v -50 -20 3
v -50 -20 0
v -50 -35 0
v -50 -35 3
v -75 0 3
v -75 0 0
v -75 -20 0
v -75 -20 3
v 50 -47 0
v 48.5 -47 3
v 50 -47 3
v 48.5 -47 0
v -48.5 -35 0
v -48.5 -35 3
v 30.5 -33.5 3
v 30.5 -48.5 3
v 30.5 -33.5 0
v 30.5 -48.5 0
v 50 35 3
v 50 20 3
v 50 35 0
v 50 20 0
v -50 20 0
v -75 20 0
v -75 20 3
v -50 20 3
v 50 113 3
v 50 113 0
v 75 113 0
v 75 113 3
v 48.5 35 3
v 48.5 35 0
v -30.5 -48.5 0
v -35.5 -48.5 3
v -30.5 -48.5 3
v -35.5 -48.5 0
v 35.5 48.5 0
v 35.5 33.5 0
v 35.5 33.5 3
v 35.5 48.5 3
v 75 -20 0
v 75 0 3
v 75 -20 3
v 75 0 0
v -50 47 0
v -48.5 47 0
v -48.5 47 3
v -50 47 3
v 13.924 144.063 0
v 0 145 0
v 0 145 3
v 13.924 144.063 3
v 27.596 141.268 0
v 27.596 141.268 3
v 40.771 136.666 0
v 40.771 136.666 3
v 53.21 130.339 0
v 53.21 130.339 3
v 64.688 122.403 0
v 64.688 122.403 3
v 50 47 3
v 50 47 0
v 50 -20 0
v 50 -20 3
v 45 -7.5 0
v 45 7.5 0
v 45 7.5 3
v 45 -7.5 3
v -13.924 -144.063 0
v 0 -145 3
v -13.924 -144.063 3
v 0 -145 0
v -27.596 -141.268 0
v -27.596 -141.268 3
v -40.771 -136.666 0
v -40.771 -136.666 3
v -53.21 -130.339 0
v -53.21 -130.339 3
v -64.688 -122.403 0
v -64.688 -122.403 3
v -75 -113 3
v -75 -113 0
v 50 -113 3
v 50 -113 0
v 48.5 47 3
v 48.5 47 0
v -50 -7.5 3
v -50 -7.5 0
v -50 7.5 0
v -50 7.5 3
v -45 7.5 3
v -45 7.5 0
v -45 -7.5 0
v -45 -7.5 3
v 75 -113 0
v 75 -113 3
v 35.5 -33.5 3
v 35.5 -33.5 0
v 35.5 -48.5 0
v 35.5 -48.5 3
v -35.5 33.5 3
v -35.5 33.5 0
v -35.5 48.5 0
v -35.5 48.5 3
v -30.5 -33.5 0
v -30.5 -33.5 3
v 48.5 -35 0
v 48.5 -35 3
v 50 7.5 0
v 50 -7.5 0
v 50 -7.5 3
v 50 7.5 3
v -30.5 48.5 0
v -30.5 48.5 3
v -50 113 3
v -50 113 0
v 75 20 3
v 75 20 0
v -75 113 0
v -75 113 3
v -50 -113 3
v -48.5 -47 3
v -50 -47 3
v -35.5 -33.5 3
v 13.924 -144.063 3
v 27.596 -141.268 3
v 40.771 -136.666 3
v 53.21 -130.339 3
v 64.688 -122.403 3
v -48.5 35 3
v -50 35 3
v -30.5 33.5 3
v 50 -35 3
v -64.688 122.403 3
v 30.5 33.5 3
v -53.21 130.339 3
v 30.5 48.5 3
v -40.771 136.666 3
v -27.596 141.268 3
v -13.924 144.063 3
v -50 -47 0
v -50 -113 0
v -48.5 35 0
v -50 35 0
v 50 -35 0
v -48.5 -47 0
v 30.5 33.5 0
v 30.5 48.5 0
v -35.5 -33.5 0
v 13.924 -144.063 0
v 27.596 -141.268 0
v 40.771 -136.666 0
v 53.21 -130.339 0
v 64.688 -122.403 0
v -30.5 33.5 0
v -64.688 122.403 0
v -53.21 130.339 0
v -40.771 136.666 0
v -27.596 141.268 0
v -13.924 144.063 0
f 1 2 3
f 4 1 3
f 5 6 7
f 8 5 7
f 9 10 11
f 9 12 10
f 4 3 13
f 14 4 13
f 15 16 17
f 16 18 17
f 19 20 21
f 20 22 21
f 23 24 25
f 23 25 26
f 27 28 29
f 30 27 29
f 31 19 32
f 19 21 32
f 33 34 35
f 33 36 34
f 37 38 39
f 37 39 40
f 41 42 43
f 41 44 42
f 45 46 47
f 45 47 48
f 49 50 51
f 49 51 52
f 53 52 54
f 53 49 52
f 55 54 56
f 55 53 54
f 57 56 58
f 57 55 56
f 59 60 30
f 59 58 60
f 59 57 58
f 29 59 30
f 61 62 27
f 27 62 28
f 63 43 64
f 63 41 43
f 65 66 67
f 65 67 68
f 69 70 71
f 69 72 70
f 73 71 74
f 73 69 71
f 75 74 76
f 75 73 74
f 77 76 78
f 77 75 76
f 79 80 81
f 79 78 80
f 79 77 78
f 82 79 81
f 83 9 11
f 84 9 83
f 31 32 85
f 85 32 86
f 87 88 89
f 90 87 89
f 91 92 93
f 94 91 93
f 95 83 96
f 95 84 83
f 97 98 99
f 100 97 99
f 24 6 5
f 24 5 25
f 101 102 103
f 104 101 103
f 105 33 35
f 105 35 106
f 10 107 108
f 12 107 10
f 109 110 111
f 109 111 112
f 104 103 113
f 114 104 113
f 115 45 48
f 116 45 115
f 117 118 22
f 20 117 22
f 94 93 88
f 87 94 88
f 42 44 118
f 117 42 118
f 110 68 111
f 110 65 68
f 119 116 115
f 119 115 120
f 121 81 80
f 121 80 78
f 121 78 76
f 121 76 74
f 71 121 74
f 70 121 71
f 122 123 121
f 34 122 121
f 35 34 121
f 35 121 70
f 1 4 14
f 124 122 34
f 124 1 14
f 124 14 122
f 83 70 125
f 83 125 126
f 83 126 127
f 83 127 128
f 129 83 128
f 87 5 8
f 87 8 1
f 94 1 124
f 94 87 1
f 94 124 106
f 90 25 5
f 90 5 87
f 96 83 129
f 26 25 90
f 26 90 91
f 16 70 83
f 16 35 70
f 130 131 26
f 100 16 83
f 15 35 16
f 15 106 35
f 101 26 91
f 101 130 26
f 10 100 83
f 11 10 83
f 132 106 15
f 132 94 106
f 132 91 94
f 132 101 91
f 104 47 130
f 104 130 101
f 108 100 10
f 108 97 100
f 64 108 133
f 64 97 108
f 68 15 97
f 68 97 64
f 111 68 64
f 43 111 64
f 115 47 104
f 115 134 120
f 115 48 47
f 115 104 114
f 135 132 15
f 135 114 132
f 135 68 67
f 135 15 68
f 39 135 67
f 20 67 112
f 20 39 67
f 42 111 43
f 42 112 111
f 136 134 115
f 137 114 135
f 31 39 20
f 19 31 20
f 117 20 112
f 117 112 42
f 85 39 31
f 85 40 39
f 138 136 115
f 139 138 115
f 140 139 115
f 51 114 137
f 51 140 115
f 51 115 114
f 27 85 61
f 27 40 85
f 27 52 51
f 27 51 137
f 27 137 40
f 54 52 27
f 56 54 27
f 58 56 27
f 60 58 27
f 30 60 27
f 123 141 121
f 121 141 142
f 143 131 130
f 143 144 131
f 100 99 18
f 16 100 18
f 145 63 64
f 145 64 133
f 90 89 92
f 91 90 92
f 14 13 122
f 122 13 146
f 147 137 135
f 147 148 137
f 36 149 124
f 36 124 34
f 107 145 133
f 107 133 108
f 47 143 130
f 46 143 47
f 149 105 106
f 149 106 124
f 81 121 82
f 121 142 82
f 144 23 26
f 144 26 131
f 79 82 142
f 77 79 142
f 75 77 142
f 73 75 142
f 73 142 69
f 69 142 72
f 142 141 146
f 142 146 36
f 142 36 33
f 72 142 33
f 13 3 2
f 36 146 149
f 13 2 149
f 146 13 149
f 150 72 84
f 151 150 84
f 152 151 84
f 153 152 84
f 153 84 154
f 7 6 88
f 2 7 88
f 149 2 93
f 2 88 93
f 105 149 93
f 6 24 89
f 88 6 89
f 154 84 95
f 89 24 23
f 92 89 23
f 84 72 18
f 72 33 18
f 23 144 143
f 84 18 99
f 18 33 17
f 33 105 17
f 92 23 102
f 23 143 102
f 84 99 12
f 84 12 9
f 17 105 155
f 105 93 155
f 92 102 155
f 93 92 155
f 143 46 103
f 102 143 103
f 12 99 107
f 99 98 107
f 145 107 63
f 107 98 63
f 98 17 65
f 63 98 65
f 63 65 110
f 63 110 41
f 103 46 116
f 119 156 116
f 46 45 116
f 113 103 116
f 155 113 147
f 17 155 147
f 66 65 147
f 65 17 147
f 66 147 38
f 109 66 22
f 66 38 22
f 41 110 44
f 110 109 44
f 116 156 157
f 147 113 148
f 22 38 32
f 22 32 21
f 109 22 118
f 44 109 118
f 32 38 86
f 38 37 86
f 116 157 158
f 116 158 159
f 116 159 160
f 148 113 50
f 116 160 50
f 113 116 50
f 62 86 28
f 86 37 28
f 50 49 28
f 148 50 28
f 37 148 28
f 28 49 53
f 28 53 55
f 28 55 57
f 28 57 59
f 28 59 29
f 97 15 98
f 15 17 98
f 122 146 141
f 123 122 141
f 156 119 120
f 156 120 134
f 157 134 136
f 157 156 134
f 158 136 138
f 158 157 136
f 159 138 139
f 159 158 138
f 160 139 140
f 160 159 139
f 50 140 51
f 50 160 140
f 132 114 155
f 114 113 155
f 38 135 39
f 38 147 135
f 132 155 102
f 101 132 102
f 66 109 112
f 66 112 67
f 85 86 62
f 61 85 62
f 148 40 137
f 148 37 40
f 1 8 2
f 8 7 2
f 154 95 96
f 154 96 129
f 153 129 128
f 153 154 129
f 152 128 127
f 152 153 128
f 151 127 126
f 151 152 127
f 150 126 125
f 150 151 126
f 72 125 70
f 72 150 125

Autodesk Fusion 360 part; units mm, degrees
sketch "Sketch1" plane through (0, 0, 0) normal (0, 0, 1) x (1, 0, 0)
  line L0 (0, 0) -> (75, 0) construction
  line L1 (0, 0) -> (0, 145) construction
  line L2 (75, 0) -> (75, 20)
  line L3 (75, 20) -> (50, 20)
  line L4 (50, 20) -> (50, 113)
  line L5 (50, 113) -> (75, 113)
  arc A0 (75, 113) -> (0, 145) centre (0, 41.1094) ccw
  line L6 (0, 145) -> (-55.6559, 145) construction
  line L7 (-75, 0) -> (-75, 20)
  line L8 (-75, 20) -> (-50, 20)
  line L9 (-50, 20) -> (-50, 113)
  line L10 (-50, 113) -> (-75, 113)
  arc A1 (0, 145) -> (-75, 113) centre (0, 41.1094) ccw
  line L11 (75, 0) -> (75, -20)
  line L12 (75, -20) -> (50, -20)
  line L13 (50, -20) -> (50, -113)
  line L14 (50, -113) -> (75, -113)
  arc A2 (0, -145) -> (75, -113) centre (0, -41.1094) ccw
  line L15 (-50, -113) -> (-75, -113)
  line L16 (-50, -20) -> (-50, -113)
  line L17 (-75, -20) -> (-50, -20)
  line L18 (-75, 0) -> (-75, -20)
  arc A3 (-75, -113) -> (0, -145) centre (0, -41.1094) ccw
  line L19 (50, 35) -> (48.5, 35)
  line L20 (48.5, 35) -> (48.5, 47)
  line L21 (48.5, 47) -> (50, 47)
  line L22 (50, 47) -> (50, 35)
  line L23 (-50, 47) -> (-50, 35)
  line L24 (-50, 35) -> (-48.5, 35)
  line L25 (-48.5, 35) -> (-48.5, 47)
  line L26 (-48.5, 47) -> (-50, 47)
  line L27 (-48.5, -47) -> (-50, -47)
  line L28 (-50, -47) -> (-50, -35)
  line L29 (50, -47) -> (50, -35)
  line L30 (50, -35) -> (48.5, -35)
  line L31 (-50, -35) -> (-48.5, -35)
  line L32 (48.5, -35) -> (48.5, -47)
  line L33 (-48.5, -35) -> (-48.5, -47)
  line L34 (48.5, -47) -> (50, -47)
  line L35 (-50, 7.5) -> (-45, 7.5)
  line L36 (-45, 7.5) -> (-45, -7.5)
  line L37 (-45, -7.5) -> (-50, -7.5)
  line L38 (-50, -7.5) -> (-50, 7.5)
  line L39 (-45, 0) -> (0, 0) construction
  line L40 (50, 7.5) -> (45, 7.5)
  line L41 (45, 7.5) -> (45, -7.5)
  line L42 (45, -7.5) -> (50, -7.5)
  line L43 (50, -7.5) -> (50, 7.5)
  line L44 (-35.5, 48.5) -> (-30.5, 48.5)
  line L45 (-30.5, 48.5) -> (-30.5, 33.5)
  line L46 (-30.5, 33.5) -> (-35.5, 33.5)
  line L47 (-35.5, 33.5) -> (-35.5, 48.5)
  line L48 (-48.5, 41) -> (-35.5, 41) construction
  line L49 (30.5, 48.5) -> (30.5, 33.5)
  line L50 (30.5, 33.5) -> (35.5, 33.5)
  line L51 (35.5, 33.5) -> (35.5, 48.5)
  line L52 (35.5, 48.5) -> (30.5, 48.5)
  line L53 (-30.5, -48.5) -> (-30.5, -33.5)
  line L54 (-30.5, -33.5) -> (-35.5, -33.5)
  line L55 (-35.5, -33.5) -> (-35.5, -48.5)
  line L56 (-35.5, -48.5) -> (-30.5, -48.5)
  line L57 (35.5, -33.5) -> (35.5, -48.5)
  line L58 (35.5, -48.5) -> (30.5, -48.5)
  line L59 (30.5, -48.5) -> (30.5, -33.5)
  line L60 (30.5, -33.5) -> (35.5, -33.5)
  point P0 (35.5, 41)
  dimension "d6" = 75
  dimension "d7" = 145
  dimension "d8" = 20
  dimension "d9" = 25
  dimension "d10" = 93
  dimension "d11" = 15
  dimension "d12" = 1.5
  dimension "d13" = 12
  dimension "d15" = 5
  dimension "d16" = 15
  dimension "d17" = 25
  dimension "d18" = 5
  dimension "d19" = 15
  dimension "d20" = 13
extrude "Extrude1" add sketch "Sketch1" along normal blind 3 contours L2 L3 L4 L5 A0 L7 L8 L9 L10 A1 L11 L12 L13 L14 A2 L15 L16 L17 L18 A3 L19 L20 L21 L24 L25 L26 L27 L30 L31 L32 L33 L34
sketch "Sketch2" plane through (0, 0, 3) normal (0, 0, 1) x (-1, 0, 0)
  line L0 (-30.5, 48.5) -> (-30.5, 33.5)
  line L1 (-30.5, 33.5) -> (-35.5, 33.5)
  line L2 (-35.5, 33.5) -> (-35.5, 48.5)
  line L3 (-35.5, 48.5) -> (-30.5, 48.5)
  line L4 (45, 7.5) -> (50, 7.5)
  line L5 (50, 7.5) -> (50, -7.5)
  line L6 (50, -7.5) -> (45, -7.5)
  line L7 (45, -7.5) -> (45, 7.5)
  line L8 (30.5, 48.5) -> (35.5, 48.5)
  line L9 (35.5, 48.5) -> (35.5, 33.5)
  line L10 (35.5, 33.5) -> (30.5, 33.5)
  line L11 (30.5, 33.5) -> (30.5, 48.5)
  line L12 (-30.5, -48.5) -> (-35.5, -48.5)
  line L13 (-35.5, -48.5) -> (-35.5, -33.5)
  line L14 (-35.5, -33.5) -> (-30.5, -33.5)
  line L15 (-30.5, -33.5) -> (-30.5, -48.5)
  line L16 (30.5, -33.5) -> (35.5, -33.5)
  line L17 (35.5, -33.5) -> (35.5, -48.5)
  line L18 (35.5, -48.5) -> (30.5, -48.5)
  line L19 (30.5, -48.5) -> (30.5, -33.5)
  line L20 (-50, -7.5) -> (-50, 7.5)
  line L21 (-50, 7.5) -> (-45, 7.5)
  line L22 (-45, 7.5) -> (-45, -7.5)
  line L23 (-45, -7.5) -> (-50, -7.5)
  line L24 (-75, 20) -> (-75, -20)
  line L25 (-75, -20) -> (-50, -20)
  line L26 (-50, -20) -> (-50, -35)
  line L27 (-50, -35) -> (-48.5, -35)
  line L28 (-48.5, -35) -> (-48.5, -47)
  line L29 (-48.5, -47) -> (-50, -47)
  line L30 (-50, -47) -> (-50, -113)
  line L31 (-50, -113) -> (-75, -113)
  arc A0 (-75, -113) -> (75, -113) centre (0, -41.1094) ccw
  line L32 (75, -113) -> (50, -113)
  line L33 (50, -113) -> (50, -47)
  line L34 (50, -47) -> (48.5, -47)
  line L35 (48.5, -47) -> (48.5, -35)
  line L36 (48.5, -35) -> (50, -35)
  line L37 (50, -35) -> (50, -20)
  line L38 (50, -20) -> (75, -20)
  line L39 (75, -20) -> (75, 20)
  line L40 (75, 20) -> (50, 20)
  line L41 (50, 20) -> (50, 35)
  line L42 (50, 35) -> (48.5, 35)
  line L43 (48.5, 35) -> (48.5, 47)
  line L44 (48.5, 47) -> (50, 47)
  line L45 (50, 47) -> (50, 113)
  line L46 (50, 113) -> (75, 113)
  arc A1 (75, 113) -> (-75, 113) centre (0, 41.1094) ccw
  line L47 (-75, 113) -> (-50, 113)
  line L48 (-50, 113) -> (-50, 47)
  line L49 (-50, 47) -> (-48.5, 47)
  line L50 (-48.5, 47) -> (-48.5, 35)
  line L51 (-48.5, 35) -> (-50, 35)
  line L52 (-50, 35) -> (-50, 20)
  line L53 (-50, 20) -> (-75, 20)
equation "d6 = ( 150 / 2 ) * 1 mm"
equation "d7 = ( 290 / 2 ) * 1 mm"
equation "d8 = ( 40 / 2 ) * 1 mm"
